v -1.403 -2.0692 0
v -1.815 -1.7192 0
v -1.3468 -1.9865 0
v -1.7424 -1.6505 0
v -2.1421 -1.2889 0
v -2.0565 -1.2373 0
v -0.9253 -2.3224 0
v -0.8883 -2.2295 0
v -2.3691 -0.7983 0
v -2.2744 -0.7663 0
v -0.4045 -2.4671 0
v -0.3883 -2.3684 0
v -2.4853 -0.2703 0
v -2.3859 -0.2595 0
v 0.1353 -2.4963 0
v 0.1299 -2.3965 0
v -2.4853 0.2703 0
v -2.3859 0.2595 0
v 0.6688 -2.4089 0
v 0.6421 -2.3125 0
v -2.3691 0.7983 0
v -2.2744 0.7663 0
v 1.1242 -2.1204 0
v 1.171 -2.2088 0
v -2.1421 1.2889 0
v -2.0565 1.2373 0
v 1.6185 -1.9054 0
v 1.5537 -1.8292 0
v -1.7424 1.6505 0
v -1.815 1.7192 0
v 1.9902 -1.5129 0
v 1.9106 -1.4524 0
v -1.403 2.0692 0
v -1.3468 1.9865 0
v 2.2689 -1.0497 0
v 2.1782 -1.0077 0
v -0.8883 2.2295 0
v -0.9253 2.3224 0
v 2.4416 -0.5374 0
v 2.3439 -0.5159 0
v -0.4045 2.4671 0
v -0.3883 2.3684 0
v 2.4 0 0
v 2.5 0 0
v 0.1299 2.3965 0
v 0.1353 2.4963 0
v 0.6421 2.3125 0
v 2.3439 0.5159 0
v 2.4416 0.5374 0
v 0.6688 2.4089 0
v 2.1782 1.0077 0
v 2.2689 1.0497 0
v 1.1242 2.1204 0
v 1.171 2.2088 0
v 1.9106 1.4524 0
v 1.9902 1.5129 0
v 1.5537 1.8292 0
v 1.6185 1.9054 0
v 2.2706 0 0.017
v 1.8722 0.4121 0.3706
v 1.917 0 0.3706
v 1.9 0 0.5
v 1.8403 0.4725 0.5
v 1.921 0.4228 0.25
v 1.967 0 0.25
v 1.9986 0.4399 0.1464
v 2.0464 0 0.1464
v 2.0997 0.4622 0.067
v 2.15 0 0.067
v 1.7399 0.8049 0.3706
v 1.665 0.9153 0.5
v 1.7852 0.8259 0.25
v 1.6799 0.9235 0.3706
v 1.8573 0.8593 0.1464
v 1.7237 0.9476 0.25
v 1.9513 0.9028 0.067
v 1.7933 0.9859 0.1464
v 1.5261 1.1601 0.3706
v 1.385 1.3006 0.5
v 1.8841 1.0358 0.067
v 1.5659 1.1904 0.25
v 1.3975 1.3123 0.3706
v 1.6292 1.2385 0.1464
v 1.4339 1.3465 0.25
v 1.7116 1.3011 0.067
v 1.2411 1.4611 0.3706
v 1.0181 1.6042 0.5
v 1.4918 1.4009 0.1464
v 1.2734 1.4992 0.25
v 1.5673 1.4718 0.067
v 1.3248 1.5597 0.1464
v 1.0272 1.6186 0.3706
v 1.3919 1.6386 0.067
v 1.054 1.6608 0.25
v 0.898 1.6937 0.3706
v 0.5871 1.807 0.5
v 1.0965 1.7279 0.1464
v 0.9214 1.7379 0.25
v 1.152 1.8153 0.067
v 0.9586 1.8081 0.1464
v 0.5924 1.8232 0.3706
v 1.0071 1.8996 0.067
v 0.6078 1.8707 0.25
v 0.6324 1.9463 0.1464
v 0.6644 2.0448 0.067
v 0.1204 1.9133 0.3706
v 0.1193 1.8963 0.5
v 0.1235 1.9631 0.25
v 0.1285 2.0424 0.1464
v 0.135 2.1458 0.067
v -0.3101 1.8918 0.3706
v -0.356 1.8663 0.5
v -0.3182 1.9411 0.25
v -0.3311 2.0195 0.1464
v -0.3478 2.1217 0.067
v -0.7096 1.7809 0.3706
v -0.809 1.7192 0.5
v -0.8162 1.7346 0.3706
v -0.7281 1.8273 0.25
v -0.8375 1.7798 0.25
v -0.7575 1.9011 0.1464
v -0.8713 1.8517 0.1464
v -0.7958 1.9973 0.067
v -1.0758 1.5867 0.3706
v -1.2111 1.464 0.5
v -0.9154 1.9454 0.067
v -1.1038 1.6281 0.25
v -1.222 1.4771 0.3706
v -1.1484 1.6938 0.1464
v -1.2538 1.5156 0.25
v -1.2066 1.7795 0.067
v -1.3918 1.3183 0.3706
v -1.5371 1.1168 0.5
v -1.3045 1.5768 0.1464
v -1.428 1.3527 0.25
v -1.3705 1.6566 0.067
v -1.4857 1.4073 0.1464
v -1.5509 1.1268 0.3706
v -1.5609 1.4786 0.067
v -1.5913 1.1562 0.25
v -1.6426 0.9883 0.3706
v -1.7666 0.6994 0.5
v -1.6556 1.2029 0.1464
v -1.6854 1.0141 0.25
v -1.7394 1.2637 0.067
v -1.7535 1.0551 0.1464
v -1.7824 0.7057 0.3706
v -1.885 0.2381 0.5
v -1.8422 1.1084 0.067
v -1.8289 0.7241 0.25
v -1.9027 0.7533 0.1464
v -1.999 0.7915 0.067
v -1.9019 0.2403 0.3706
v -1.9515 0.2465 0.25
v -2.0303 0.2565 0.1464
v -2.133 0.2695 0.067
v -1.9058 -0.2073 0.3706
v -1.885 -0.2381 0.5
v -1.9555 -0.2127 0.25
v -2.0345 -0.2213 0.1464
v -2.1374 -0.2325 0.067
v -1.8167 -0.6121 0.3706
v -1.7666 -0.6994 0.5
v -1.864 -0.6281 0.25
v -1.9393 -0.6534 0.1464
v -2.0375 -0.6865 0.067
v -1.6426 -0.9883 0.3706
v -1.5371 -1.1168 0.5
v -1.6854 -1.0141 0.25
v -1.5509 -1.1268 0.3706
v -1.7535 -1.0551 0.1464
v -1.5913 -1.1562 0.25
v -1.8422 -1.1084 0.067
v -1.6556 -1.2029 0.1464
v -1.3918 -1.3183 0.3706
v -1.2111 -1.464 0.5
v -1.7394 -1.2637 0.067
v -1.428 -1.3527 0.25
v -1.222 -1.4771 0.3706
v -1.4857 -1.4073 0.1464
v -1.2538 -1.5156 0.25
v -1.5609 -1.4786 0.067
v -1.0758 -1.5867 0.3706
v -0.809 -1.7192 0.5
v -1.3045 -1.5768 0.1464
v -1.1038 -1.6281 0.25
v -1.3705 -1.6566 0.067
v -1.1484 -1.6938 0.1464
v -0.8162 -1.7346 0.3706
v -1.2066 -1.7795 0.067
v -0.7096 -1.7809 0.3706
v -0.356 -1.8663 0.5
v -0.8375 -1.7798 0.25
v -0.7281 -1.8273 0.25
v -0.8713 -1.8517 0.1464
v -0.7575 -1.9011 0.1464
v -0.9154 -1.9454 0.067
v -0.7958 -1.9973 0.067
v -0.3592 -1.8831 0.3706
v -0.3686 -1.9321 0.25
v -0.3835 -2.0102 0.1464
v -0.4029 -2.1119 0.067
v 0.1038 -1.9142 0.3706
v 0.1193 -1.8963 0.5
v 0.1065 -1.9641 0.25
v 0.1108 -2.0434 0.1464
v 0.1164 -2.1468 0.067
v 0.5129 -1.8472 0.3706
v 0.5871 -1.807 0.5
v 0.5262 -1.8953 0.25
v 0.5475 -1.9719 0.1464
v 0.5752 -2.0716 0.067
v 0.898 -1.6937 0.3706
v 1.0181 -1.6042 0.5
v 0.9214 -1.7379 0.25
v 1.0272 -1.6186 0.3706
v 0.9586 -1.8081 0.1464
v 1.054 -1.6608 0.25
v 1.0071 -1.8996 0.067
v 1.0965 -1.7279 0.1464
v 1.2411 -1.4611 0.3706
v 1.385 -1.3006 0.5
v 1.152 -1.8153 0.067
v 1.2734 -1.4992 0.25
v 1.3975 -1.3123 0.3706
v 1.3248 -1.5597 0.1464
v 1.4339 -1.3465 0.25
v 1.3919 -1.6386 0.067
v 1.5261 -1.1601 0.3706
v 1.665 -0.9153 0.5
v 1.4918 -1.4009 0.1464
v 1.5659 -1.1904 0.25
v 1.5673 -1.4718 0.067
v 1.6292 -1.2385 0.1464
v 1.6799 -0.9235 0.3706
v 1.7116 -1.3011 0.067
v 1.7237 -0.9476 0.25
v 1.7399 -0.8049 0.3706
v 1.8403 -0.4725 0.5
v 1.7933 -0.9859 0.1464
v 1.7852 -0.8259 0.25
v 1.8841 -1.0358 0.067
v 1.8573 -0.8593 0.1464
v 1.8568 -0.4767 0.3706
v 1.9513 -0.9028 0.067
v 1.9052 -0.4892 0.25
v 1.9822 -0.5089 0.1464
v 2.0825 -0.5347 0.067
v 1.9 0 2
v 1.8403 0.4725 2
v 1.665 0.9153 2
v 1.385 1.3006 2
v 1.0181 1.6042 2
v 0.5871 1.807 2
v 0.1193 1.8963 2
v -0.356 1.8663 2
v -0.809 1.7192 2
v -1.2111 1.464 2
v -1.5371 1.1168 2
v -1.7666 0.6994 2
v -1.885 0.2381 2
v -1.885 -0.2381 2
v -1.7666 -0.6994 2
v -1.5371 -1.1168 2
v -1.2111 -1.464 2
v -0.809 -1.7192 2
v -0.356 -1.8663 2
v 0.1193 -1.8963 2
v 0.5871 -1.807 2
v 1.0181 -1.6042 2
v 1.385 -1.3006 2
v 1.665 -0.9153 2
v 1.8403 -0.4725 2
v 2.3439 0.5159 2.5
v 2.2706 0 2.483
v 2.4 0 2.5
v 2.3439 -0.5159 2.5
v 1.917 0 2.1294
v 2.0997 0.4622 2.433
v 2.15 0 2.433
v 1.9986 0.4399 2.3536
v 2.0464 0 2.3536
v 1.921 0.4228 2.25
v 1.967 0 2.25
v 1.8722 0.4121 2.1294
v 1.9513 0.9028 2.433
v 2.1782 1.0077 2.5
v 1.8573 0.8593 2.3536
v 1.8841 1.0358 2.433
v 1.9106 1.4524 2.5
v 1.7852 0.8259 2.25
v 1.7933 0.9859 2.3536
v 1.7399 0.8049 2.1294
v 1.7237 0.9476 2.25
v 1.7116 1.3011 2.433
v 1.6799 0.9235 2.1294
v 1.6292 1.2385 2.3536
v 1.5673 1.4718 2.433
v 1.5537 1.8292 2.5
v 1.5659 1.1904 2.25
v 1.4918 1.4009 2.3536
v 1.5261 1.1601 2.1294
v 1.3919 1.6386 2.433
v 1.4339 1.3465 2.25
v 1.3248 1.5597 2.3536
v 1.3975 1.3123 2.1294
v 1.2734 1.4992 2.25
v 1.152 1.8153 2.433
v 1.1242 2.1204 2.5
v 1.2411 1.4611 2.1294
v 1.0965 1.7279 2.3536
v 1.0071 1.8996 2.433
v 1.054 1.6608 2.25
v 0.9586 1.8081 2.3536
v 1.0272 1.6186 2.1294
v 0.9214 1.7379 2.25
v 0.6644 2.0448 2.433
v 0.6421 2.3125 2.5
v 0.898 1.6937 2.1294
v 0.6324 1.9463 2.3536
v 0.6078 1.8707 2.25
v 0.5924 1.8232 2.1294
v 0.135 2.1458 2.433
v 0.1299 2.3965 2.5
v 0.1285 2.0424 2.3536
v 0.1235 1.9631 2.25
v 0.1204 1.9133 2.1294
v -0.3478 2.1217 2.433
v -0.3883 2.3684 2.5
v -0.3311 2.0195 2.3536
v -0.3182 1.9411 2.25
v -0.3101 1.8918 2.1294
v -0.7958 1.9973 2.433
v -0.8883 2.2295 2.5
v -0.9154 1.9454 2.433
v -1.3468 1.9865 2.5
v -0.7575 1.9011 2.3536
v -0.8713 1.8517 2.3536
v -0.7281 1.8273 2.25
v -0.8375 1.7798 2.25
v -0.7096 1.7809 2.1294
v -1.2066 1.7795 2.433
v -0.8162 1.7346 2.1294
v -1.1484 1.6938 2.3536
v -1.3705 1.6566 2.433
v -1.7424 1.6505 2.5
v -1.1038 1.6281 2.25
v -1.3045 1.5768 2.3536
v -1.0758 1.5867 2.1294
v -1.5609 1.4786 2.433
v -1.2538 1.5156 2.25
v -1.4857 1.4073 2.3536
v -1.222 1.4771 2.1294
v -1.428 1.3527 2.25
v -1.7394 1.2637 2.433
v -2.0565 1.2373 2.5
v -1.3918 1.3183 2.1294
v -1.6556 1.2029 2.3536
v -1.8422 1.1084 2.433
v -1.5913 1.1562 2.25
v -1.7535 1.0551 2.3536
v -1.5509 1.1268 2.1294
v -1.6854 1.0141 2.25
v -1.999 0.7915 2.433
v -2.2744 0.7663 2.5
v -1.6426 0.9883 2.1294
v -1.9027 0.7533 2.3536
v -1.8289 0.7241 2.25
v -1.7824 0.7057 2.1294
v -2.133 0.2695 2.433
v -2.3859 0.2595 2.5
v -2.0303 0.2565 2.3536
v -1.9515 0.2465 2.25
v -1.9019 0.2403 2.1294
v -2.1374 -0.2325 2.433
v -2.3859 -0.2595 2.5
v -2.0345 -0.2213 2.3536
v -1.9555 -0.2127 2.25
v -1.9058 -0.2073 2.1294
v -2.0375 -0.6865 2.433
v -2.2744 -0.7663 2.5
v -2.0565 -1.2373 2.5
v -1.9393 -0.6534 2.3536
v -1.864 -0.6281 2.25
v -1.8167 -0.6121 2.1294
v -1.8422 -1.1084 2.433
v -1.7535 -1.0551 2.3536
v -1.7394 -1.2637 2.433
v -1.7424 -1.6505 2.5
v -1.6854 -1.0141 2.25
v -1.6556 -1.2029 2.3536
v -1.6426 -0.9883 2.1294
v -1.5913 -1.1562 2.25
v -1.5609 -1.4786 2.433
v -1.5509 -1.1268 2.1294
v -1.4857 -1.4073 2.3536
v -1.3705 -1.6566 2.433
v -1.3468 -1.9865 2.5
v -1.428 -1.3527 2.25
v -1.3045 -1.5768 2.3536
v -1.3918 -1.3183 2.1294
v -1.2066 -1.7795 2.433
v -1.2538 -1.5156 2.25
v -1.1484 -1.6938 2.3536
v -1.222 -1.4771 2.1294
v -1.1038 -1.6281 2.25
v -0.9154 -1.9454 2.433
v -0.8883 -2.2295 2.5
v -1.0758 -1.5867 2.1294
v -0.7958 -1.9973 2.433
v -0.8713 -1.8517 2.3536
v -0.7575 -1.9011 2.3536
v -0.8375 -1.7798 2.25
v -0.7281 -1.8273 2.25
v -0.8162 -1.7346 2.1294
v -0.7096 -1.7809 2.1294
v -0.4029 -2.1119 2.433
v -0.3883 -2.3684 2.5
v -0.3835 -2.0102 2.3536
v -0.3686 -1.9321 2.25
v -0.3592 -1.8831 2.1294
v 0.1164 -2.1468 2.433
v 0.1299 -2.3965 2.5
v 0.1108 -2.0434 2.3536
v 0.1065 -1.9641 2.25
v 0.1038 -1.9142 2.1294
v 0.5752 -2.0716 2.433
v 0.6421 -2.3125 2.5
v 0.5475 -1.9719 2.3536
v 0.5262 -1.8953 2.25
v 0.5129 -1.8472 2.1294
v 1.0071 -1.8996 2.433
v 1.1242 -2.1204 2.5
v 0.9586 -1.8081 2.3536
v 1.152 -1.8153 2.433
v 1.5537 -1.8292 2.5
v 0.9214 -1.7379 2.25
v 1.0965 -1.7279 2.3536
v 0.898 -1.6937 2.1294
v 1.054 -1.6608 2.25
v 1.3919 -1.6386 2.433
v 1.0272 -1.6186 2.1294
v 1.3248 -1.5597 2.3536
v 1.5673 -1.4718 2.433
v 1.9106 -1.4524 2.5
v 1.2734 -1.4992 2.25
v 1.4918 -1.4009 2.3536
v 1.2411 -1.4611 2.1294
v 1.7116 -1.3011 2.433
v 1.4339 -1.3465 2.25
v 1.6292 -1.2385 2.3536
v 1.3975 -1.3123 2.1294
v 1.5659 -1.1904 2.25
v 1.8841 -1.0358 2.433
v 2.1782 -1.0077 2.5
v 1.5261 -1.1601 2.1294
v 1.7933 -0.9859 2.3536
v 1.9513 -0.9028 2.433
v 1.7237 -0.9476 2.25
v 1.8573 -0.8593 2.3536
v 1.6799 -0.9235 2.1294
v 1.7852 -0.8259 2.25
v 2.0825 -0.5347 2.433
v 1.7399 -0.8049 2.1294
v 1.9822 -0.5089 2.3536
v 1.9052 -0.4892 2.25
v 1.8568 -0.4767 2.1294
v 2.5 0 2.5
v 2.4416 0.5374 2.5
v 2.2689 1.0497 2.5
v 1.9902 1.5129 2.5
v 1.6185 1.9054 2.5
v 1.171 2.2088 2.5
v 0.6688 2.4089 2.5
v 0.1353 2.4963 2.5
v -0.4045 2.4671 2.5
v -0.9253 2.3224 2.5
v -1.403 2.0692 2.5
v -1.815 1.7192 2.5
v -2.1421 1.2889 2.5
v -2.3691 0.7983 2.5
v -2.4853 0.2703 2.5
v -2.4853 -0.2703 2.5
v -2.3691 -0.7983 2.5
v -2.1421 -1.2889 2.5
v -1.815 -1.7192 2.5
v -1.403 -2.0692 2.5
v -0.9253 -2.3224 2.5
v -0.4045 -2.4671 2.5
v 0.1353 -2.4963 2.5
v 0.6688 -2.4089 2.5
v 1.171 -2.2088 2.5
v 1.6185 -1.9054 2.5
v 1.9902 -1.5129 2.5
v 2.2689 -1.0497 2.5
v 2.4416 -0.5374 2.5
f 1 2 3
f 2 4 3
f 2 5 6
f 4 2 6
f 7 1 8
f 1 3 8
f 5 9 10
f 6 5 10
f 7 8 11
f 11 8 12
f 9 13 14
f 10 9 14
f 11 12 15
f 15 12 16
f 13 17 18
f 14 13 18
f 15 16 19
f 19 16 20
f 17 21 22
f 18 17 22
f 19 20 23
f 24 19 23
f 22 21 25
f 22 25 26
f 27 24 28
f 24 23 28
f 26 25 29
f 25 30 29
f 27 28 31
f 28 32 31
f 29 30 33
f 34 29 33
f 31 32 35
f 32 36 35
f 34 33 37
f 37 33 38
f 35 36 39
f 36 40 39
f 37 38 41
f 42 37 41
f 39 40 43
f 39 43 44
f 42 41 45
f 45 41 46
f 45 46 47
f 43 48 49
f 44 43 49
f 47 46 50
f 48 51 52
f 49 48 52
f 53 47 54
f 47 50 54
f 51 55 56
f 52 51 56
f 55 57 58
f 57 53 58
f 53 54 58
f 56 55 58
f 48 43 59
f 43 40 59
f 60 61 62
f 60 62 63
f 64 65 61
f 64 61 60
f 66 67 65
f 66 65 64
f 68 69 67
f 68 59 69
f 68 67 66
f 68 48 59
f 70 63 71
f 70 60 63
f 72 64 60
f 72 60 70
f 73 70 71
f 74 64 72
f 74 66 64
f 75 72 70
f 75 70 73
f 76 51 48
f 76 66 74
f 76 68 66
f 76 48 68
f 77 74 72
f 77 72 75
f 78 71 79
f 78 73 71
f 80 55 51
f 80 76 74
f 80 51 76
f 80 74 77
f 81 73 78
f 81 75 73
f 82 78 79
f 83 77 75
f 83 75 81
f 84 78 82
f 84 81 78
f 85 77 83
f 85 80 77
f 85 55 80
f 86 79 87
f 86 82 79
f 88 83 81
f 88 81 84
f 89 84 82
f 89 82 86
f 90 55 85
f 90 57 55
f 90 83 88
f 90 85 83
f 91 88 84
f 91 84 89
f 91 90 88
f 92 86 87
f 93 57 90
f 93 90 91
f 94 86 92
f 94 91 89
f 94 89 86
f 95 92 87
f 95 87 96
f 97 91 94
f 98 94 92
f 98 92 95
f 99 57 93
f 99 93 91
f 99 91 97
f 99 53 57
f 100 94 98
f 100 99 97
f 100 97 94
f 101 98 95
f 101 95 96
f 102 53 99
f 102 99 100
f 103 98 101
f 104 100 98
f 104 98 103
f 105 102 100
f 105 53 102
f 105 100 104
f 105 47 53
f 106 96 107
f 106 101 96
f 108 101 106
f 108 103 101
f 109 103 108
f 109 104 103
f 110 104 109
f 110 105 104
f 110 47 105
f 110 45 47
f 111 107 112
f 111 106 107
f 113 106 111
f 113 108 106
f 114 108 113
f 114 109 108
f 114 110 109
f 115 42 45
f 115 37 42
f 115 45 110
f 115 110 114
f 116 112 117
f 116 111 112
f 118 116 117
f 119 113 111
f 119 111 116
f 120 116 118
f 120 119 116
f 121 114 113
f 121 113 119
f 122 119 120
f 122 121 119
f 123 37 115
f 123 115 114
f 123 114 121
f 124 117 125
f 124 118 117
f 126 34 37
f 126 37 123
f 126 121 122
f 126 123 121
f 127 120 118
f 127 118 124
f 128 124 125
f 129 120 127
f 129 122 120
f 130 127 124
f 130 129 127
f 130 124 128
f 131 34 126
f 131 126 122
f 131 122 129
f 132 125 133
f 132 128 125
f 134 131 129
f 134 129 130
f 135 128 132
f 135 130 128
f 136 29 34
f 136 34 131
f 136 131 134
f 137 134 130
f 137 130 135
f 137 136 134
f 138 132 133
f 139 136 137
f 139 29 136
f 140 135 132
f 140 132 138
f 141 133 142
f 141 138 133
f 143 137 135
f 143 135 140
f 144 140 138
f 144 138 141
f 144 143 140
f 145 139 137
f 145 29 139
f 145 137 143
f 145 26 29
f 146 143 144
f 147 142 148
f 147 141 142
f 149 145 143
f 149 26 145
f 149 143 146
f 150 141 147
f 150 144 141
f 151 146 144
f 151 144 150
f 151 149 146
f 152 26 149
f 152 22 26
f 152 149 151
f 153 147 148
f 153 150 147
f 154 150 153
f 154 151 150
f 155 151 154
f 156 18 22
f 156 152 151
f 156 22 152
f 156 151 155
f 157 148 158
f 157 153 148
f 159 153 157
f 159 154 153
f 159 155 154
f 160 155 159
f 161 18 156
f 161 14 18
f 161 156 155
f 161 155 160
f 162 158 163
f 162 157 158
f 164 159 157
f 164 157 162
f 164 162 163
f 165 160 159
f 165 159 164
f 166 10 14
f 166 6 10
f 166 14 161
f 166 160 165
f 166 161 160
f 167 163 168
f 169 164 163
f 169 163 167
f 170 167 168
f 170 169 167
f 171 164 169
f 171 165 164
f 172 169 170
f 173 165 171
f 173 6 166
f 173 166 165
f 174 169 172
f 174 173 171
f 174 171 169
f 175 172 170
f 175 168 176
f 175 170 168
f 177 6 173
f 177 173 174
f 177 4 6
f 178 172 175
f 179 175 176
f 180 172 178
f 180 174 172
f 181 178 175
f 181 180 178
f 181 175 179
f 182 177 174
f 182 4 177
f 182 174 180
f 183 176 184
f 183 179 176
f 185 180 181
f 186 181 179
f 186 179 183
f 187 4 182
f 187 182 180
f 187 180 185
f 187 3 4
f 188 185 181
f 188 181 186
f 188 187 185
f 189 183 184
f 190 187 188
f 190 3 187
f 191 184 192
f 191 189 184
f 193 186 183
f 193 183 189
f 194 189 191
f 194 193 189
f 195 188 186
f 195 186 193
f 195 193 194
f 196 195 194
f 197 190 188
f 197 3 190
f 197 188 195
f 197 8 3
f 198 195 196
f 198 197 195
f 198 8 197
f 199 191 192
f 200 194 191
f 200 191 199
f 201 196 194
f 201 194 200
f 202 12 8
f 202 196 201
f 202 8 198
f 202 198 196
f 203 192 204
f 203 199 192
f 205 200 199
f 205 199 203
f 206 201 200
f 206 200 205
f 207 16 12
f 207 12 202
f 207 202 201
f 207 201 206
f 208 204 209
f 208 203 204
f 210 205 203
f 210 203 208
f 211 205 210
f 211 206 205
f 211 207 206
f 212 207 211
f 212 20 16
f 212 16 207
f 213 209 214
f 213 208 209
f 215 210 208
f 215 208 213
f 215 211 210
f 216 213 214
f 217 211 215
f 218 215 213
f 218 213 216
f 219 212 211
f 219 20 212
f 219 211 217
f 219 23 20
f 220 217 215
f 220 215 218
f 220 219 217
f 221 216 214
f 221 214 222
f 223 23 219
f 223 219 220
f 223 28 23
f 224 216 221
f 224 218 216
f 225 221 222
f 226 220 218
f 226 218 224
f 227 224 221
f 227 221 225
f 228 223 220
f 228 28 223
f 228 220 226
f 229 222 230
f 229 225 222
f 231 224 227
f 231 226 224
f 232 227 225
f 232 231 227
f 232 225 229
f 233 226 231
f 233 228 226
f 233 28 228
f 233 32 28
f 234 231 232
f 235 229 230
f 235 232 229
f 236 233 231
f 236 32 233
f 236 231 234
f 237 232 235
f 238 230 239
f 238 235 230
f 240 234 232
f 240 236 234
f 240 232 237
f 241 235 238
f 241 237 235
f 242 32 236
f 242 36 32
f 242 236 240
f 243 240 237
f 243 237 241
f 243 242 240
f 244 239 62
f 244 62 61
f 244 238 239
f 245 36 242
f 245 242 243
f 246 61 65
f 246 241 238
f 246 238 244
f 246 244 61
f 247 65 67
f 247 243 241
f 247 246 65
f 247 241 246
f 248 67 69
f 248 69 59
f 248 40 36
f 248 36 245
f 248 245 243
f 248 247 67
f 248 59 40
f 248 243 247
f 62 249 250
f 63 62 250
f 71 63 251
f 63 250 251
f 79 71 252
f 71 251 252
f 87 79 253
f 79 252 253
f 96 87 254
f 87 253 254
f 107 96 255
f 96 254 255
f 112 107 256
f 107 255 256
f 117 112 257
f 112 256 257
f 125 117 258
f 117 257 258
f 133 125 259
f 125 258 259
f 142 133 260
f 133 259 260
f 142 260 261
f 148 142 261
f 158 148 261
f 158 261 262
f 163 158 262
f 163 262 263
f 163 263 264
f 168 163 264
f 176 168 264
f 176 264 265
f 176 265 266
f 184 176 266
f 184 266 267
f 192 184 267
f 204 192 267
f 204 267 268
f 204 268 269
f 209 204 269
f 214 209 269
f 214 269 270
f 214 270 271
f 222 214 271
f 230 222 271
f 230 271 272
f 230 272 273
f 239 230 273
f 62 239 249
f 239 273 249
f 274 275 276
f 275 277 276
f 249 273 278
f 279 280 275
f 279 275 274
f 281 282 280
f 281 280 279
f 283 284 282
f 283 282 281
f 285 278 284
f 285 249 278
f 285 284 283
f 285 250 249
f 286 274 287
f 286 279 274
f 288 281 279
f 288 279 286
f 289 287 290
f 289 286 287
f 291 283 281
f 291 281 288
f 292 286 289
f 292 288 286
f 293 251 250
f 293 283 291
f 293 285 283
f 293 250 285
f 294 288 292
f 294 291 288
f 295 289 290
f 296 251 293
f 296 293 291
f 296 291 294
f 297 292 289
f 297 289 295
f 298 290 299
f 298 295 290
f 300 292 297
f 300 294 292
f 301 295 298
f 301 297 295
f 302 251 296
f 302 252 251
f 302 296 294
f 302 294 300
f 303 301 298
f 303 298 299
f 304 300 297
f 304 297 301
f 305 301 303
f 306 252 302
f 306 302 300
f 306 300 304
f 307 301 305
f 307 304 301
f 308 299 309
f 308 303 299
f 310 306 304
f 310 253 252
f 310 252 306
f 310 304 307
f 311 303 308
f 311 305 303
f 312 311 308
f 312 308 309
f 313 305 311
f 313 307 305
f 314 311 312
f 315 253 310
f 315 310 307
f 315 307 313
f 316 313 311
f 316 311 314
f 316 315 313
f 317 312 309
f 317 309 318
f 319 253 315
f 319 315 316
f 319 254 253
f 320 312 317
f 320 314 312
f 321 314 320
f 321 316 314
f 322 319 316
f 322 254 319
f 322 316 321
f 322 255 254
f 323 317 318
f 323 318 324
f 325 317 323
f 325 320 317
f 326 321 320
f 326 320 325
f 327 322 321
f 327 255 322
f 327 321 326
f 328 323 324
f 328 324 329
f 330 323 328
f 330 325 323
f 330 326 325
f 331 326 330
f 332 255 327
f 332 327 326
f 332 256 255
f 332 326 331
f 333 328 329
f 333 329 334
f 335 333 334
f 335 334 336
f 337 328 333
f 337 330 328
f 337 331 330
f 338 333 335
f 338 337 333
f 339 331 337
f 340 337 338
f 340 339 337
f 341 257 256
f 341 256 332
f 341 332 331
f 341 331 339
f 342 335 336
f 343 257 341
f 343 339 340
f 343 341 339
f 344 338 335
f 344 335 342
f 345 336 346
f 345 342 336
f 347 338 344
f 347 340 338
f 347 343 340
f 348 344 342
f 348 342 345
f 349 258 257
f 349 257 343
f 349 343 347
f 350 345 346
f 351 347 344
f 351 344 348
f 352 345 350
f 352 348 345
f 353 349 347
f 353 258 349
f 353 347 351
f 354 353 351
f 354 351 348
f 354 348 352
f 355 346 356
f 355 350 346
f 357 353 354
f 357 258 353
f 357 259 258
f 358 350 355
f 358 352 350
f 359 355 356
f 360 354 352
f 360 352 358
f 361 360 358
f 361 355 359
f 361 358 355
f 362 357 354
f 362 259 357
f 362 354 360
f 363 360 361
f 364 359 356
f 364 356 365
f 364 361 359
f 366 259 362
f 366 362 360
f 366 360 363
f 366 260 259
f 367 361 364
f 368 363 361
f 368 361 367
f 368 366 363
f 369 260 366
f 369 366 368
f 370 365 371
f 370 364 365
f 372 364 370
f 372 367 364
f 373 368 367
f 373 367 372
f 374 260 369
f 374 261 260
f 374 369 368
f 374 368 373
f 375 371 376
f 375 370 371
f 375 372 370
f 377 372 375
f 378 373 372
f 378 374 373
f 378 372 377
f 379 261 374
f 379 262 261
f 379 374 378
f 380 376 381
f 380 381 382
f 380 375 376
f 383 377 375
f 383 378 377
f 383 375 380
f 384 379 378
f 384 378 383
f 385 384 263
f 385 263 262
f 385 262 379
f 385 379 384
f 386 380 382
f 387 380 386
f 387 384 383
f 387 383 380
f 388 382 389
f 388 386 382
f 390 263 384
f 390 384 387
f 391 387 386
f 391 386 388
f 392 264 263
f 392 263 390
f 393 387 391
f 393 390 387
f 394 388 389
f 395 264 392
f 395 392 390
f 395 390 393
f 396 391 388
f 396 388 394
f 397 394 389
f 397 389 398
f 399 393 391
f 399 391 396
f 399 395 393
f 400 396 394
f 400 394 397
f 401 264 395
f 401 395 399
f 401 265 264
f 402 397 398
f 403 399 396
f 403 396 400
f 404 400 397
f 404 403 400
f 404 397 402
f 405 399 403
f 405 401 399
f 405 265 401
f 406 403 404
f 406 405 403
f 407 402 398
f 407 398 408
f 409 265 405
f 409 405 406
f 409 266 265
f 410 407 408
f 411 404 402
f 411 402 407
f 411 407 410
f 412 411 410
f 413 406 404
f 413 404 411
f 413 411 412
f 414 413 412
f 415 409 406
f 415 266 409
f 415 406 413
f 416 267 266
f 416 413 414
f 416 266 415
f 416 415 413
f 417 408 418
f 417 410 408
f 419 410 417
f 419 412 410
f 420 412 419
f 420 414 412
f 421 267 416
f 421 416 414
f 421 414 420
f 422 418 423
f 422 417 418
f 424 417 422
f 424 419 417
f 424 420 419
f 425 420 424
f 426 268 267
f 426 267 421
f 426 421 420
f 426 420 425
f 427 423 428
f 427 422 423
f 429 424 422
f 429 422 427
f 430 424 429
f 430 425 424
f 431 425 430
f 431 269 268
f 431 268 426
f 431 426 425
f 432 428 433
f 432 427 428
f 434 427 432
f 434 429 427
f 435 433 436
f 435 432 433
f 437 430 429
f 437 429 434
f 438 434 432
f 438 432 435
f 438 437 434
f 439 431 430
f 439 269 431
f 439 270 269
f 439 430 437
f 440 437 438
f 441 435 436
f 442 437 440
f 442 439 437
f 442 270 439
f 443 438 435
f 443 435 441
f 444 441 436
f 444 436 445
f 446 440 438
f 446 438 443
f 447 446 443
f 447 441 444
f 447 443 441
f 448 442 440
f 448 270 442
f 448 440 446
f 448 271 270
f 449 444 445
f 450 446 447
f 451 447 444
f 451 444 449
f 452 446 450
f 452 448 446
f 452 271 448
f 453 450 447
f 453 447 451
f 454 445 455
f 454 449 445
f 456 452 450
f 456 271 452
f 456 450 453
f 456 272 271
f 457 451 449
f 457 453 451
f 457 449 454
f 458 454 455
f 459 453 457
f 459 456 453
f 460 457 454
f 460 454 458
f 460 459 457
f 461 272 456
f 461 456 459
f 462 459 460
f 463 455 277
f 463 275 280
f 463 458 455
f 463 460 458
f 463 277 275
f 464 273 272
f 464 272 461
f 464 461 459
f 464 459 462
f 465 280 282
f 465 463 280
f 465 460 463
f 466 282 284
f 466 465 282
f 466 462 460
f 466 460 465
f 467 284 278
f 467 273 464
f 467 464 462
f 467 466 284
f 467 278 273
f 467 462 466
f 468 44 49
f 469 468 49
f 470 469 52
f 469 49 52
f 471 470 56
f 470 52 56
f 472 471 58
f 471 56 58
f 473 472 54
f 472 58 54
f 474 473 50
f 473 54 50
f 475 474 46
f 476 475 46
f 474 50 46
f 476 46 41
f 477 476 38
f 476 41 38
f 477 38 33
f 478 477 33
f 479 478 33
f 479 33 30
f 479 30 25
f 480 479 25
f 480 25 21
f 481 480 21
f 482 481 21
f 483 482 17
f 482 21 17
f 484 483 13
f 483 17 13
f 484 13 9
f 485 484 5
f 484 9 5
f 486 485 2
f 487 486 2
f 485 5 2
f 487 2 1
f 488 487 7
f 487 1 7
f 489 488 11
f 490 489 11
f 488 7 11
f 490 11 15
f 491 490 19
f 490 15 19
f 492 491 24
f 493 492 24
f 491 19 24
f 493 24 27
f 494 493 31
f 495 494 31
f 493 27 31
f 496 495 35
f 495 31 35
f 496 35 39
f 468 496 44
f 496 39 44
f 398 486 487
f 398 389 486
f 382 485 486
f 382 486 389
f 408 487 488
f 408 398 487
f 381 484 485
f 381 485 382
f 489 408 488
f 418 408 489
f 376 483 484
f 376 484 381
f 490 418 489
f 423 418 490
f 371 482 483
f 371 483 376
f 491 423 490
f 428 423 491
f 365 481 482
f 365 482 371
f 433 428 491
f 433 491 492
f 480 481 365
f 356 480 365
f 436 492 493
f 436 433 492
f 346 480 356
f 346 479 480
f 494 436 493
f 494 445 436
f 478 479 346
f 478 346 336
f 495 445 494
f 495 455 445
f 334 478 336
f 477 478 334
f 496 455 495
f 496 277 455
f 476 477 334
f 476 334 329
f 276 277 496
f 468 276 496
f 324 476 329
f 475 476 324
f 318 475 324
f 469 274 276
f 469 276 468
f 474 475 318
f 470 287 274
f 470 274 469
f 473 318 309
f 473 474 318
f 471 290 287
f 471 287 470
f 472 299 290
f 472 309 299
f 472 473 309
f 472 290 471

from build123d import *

# Parameters (mm, degrees)
SKETCH_R     = 2.5
PAD_DEPTH    = 2.5
SKETCH001_R  = 1.9
POCKET_DEPTH = 5
FILLET_R     = 0.5
FILLET001_R  = 0.5


with BuildPart() as part:
    # Sketch → Pad (new body)
    with BuildSketch(Plane.XY):
        Circle(SKETCH_R)
    extrude(amount=PAD_DEPTH)

    # Sketch001 (on Face3 of Pad) → Pocket (cut)
    with BuildSketch(Plane.XY.offset(2.5)):
        Circle(SKETCH001_R)
    extrude(amount=-POCKET_DEPTH, mode=Mode.SUBTRACT)

    # Fillet
    fillet_edges = [part.edges().sort_by_distance(p)[0] for p in [
        (-1.9, 0, 2.5),
    ]]
    fillet(fillet_edges, radius=FILLET_R)

    # Fillet001
    fillet001_edges = [part.edges().sort_by_distance(p)[0] for p in [
        (-1.9, 0, 0),
    ]]
    fillet(fillet001_edges, radius=FILLET001_R)


solid = part.part
